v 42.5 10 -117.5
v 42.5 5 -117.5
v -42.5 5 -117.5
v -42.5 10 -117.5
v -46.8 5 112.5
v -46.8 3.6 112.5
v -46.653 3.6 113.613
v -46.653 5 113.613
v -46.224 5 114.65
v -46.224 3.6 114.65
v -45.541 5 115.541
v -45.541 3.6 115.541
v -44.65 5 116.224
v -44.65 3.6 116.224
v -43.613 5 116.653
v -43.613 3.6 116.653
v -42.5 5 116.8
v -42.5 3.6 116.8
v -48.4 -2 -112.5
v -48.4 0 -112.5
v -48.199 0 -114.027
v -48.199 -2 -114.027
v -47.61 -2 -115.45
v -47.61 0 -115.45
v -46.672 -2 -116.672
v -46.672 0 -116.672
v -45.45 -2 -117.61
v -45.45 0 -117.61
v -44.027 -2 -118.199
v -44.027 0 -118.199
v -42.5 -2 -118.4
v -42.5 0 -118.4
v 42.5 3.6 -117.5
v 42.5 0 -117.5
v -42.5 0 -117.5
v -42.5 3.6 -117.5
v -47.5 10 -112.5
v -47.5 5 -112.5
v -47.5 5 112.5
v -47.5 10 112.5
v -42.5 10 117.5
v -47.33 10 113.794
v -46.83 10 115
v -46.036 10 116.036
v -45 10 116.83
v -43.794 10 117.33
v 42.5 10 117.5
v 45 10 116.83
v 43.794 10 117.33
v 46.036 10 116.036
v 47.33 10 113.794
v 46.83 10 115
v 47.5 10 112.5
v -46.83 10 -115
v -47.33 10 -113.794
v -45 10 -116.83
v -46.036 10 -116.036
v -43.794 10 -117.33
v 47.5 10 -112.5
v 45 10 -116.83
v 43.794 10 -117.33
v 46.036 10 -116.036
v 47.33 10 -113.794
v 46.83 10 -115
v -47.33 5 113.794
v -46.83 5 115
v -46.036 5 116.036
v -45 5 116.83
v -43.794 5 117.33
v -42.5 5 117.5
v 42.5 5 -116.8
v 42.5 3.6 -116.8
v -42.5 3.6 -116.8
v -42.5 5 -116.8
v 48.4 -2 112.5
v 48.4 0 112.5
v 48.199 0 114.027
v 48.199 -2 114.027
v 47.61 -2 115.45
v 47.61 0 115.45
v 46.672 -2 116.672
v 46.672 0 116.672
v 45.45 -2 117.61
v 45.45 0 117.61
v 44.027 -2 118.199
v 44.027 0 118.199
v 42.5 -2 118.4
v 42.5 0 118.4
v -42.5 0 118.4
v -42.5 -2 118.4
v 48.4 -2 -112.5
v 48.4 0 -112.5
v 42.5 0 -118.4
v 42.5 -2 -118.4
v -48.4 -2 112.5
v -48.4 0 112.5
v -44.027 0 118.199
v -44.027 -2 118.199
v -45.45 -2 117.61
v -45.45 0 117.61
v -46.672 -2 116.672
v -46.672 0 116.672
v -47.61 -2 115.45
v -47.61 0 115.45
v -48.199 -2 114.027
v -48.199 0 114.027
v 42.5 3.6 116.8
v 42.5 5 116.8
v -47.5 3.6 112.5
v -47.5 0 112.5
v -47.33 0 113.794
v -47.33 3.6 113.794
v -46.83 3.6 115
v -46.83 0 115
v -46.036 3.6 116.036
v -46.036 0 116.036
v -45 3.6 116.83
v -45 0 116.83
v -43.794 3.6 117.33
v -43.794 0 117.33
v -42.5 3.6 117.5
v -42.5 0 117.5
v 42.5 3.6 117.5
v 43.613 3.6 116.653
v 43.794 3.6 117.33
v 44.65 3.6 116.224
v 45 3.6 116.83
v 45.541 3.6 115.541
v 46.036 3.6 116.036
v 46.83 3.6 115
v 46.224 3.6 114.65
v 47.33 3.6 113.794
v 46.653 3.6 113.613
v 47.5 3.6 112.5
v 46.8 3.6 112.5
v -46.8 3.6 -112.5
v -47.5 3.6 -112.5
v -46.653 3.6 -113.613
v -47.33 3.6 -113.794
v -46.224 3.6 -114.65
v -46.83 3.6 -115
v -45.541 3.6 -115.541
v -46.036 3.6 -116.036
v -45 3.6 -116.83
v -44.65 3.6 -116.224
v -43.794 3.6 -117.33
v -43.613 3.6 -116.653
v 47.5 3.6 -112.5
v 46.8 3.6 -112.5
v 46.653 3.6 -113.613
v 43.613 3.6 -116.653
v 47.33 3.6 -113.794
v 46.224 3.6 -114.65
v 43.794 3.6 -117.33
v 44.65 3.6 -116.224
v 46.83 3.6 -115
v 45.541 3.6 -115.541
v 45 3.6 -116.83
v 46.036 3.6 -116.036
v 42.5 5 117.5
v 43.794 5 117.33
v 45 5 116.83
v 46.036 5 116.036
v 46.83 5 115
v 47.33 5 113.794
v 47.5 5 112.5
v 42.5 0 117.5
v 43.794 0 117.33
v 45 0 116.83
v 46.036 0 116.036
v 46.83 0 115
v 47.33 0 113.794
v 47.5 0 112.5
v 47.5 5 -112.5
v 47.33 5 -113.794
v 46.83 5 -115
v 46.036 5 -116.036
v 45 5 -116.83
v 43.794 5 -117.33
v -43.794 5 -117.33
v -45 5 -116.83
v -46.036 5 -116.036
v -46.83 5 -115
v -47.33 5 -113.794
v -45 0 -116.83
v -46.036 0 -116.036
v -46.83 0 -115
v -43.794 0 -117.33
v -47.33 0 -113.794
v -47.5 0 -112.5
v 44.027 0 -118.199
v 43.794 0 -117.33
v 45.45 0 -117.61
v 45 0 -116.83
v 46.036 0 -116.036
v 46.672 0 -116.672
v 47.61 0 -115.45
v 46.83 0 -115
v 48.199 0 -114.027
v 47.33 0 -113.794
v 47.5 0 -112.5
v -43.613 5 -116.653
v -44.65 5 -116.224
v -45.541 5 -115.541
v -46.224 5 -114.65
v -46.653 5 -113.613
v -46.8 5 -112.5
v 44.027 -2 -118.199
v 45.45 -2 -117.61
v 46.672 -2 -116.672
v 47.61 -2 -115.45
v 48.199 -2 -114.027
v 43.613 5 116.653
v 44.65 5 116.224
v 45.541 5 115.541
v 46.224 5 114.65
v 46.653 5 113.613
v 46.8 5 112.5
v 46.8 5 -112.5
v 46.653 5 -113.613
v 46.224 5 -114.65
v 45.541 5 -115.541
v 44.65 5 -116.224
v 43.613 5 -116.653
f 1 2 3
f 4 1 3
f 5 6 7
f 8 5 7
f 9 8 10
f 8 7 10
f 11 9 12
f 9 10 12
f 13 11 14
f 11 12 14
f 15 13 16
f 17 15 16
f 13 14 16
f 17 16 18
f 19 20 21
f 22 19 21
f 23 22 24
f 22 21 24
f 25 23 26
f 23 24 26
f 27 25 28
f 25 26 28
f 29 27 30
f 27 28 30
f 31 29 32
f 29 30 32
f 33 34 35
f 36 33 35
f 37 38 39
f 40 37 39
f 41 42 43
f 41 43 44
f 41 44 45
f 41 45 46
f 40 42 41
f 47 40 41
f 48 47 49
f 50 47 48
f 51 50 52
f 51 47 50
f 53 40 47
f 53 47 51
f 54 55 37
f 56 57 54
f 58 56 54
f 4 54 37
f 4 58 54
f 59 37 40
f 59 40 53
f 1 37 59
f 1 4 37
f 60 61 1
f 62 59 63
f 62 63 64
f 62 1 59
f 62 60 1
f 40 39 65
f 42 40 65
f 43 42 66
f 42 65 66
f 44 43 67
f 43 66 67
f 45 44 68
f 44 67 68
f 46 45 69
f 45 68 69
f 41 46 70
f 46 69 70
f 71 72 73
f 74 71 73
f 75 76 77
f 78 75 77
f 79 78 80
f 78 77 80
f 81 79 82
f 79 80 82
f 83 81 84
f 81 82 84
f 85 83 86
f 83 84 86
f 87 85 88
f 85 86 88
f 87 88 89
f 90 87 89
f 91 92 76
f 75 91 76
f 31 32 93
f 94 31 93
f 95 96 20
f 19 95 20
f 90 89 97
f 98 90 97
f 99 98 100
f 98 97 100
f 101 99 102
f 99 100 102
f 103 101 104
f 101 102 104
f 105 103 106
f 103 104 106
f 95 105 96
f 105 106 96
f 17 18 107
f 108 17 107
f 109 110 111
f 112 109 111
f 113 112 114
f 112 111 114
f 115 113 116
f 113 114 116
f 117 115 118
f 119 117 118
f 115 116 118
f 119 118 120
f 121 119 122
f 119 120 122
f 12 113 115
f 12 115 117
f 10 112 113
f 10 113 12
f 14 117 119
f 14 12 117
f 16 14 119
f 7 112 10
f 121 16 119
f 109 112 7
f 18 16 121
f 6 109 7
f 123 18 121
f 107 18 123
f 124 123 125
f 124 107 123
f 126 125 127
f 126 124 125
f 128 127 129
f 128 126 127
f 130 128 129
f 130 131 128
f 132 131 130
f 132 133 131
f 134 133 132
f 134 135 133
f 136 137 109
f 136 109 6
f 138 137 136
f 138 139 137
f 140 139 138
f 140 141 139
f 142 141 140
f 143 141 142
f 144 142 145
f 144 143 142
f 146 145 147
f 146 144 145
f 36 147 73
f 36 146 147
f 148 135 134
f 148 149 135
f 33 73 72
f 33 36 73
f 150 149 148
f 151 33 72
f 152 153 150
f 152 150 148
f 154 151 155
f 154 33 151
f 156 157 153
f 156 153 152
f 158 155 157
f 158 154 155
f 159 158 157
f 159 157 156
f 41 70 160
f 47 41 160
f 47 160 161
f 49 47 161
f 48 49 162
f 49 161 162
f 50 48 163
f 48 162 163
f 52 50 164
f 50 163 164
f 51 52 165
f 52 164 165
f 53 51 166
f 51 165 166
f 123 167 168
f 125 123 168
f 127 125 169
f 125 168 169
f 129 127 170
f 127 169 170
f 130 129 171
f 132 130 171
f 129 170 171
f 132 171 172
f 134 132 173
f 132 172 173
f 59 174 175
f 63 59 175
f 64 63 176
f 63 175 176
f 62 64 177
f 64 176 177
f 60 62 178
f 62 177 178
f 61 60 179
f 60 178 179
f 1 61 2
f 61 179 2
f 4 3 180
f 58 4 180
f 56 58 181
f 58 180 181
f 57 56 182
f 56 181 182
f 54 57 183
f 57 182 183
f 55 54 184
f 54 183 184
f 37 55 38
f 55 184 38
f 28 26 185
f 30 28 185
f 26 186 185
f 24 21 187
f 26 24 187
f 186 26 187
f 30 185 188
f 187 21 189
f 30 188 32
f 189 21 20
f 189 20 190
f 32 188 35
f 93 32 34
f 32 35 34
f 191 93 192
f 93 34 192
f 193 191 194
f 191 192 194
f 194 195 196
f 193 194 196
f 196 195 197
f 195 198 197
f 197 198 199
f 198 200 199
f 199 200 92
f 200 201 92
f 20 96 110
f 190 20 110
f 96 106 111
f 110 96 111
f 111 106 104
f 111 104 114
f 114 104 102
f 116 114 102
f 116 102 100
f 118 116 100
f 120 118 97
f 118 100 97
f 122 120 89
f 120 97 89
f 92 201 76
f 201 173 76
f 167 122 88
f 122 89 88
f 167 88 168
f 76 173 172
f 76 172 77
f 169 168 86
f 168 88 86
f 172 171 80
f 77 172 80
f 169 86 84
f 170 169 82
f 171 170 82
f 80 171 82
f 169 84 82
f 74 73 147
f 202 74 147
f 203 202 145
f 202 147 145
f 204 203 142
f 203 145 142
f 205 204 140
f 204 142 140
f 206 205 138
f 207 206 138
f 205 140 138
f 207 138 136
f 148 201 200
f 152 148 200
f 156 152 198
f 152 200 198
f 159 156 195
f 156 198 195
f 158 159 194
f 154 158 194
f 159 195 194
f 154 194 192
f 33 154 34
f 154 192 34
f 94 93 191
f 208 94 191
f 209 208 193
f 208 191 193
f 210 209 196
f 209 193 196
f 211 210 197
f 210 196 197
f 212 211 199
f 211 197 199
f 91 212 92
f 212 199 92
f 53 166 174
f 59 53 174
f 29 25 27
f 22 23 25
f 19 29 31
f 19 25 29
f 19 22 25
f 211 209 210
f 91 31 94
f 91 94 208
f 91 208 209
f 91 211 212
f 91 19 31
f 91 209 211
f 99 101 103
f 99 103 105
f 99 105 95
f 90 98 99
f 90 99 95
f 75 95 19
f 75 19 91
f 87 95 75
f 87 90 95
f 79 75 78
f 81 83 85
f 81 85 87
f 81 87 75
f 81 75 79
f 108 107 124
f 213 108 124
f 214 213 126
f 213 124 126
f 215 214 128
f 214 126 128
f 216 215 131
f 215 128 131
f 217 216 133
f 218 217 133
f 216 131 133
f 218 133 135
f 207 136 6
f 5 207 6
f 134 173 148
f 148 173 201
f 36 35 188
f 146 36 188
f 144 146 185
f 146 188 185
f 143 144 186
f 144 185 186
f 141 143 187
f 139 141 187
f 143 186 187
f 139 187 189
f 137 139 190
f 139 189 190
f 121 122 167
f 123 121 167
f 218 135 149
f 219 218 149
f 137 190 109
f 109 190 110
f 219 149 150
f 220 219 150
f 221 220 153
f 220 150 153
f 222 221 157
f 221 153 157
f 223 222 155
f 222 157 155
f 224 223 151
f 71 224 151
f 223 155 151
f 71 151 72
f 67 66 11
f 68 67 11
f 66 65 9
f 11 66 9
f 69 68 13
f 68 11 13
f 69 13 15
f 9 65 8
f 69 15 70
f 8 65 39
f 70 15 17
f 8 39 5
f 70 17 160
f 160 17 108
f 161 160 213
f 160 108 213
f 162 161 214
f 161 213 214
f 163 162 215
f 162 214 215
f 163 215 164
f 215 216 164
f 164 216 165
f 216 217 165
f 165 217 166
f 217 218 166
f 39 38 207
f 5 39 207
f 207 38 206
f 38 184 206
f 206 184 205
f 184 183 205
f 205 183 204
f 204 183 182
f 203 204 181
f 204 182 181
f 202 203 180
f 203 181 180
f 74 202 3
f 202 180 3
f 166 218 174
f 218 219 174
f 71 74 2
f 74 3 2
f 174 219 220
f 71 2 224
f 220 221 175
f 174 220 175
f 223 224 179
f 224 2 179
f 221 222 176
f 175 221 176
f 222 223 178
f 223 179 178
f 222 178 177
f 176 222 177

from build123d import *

# Parameters (mm, degrees)
BOSS_EXTRUDE1_DEPTH = 10
BOSS_EXTRUDE2_DEPTH = 2
CUT_EXTRUDE1_START  = -6.4
CUT_EXTRUDE1_DEPTH  = 1.4


with BuildPart() as part:
    # Sketch1 → Boss-Extrude1 (new body)
    with BuildSketch(Plane(origin=(0, 0, 0), x_dir=(1, 0, 0), z_dir=(0, 1, 0))):
        with BuildLine():
            Line((-42.5, -117.5), (42.5, -117.5))
            ThreePointArc((42.5, -117.5), (46.035533906, -116.035533906), (47.5, -112.5))
            Line((47.5, -112.5), (47.5, 112.5))
            ThreePointArc((47.5, 112.5), (46.035533906, 116.035533906), (42.5, 117.5))
            Line((42.5, 117.5), (-42.5, 117.5))
            ThreePointArc((-42.5, 117.5), (-46.035533906, 116.035533906), (-47.5, 112.5))
            Line((-47.5, 112.5), (-47.5, -112.5))
            ThreePointArc((-47.5, -112.5), (-46.035533906, -116.035533906), (-42.5, -117.5))
        make_face()
    extrude(amount=BOSS_EXTRUDE1_DEPTH)

    # Sketch2 → Boss-Extrude2 (add)
    with BuildSketch(Plane.XZ):
        with BuildLine():
            Line((-48.4, 112.5), (-48.4, -112.5))
            ThreePointArc((-48.4, -112.5), (-46.671930009, -116.671930009), (-42.5, -118.4))
            Line((-42.5, -118.4), (42.5, -118.4))
            ThreePointArc((42.5, -118.4), (46.671930009, -116.671930009), (48.4, -112.5))
            Line((48.4, -112.5), (48.4, 112.5))
            ThreePointArc((48.4, 112.5), (46.671930009, 116.671930009), (42.5, 118.4))
            Line((42.5, 118.4), (-42.5, 118.4))
            ThreePointArc((-42.5, 118.4), (-46.671930009, 116.671930009), (-48.4, 112.5))
        make_face()
    extrude(amount=BOSS_EXTRUDE2_DEPTH)

    # Sketch3 → Cut-Extrude1 (cut)
    with BuildSketch(Plane(origin=(0, 10, 0), x_dir=(1, 0, 0), z_dir=(0, 1, 0)).offset(CUT_EXTRUDE1_START)):
        with BuildLine():
            Line((-47.5, 112.5), (-47.5, -112.5))
            ThreePointArc((-47.5, -112.5), (-46.035533906, -116.035533906), (-42.5, -117.5))
            Line((-42.5, -117.5), (42.5, -117.5))
            ThreePointArc((42.5, -117.5), (46.035533906, -116.035533906), (47.5, -112.5))
            Line((47.5, -112.5), (47.5, 112.5))
            ThreePointArc((47.5, 112.5), (46.035533906, 116.035533906), (42.5, 117.5))
            Line((42.5, 117.5), (-42.5, 117.5))
            ThreePointArc((-42.5, 117.5), (-46.035533906, 116.035533906), (-47.5, 112.5))
        make_face()
        with BuildLine():
            ThreePointArc((-42.5, 116.8), (-45.540559159, 115.540559159), (-46.8, 112.5))
            Line((-46.8, 112.5), (-46.8, -112.5))
            ThreePointArc((-46.8, -112.5), (-45.540559159, -115.540559159), (-42.5, -116.8))
            Line((-42.5, -116.8), (42.5, -116.8))
            ThreePointArc((42.5, -116.8), (45.540559159, -115.540559159), (46.8, -112.5))
            Line((46.8, -112.5), (46.8, 112.5))
            ThreePointArc((46.8, 112.5), (45.540559159, 115.540559159), (42.5, 116.8))
            Line((42.5, 116.8), (-42.5, 116.8))
        make_face(mode=Mode.SUBTRACT)
    extrude(amount=CUT_EXTRUDE1_DEPTH, mode=Mode.SUBTRACT)


solid = part.part
